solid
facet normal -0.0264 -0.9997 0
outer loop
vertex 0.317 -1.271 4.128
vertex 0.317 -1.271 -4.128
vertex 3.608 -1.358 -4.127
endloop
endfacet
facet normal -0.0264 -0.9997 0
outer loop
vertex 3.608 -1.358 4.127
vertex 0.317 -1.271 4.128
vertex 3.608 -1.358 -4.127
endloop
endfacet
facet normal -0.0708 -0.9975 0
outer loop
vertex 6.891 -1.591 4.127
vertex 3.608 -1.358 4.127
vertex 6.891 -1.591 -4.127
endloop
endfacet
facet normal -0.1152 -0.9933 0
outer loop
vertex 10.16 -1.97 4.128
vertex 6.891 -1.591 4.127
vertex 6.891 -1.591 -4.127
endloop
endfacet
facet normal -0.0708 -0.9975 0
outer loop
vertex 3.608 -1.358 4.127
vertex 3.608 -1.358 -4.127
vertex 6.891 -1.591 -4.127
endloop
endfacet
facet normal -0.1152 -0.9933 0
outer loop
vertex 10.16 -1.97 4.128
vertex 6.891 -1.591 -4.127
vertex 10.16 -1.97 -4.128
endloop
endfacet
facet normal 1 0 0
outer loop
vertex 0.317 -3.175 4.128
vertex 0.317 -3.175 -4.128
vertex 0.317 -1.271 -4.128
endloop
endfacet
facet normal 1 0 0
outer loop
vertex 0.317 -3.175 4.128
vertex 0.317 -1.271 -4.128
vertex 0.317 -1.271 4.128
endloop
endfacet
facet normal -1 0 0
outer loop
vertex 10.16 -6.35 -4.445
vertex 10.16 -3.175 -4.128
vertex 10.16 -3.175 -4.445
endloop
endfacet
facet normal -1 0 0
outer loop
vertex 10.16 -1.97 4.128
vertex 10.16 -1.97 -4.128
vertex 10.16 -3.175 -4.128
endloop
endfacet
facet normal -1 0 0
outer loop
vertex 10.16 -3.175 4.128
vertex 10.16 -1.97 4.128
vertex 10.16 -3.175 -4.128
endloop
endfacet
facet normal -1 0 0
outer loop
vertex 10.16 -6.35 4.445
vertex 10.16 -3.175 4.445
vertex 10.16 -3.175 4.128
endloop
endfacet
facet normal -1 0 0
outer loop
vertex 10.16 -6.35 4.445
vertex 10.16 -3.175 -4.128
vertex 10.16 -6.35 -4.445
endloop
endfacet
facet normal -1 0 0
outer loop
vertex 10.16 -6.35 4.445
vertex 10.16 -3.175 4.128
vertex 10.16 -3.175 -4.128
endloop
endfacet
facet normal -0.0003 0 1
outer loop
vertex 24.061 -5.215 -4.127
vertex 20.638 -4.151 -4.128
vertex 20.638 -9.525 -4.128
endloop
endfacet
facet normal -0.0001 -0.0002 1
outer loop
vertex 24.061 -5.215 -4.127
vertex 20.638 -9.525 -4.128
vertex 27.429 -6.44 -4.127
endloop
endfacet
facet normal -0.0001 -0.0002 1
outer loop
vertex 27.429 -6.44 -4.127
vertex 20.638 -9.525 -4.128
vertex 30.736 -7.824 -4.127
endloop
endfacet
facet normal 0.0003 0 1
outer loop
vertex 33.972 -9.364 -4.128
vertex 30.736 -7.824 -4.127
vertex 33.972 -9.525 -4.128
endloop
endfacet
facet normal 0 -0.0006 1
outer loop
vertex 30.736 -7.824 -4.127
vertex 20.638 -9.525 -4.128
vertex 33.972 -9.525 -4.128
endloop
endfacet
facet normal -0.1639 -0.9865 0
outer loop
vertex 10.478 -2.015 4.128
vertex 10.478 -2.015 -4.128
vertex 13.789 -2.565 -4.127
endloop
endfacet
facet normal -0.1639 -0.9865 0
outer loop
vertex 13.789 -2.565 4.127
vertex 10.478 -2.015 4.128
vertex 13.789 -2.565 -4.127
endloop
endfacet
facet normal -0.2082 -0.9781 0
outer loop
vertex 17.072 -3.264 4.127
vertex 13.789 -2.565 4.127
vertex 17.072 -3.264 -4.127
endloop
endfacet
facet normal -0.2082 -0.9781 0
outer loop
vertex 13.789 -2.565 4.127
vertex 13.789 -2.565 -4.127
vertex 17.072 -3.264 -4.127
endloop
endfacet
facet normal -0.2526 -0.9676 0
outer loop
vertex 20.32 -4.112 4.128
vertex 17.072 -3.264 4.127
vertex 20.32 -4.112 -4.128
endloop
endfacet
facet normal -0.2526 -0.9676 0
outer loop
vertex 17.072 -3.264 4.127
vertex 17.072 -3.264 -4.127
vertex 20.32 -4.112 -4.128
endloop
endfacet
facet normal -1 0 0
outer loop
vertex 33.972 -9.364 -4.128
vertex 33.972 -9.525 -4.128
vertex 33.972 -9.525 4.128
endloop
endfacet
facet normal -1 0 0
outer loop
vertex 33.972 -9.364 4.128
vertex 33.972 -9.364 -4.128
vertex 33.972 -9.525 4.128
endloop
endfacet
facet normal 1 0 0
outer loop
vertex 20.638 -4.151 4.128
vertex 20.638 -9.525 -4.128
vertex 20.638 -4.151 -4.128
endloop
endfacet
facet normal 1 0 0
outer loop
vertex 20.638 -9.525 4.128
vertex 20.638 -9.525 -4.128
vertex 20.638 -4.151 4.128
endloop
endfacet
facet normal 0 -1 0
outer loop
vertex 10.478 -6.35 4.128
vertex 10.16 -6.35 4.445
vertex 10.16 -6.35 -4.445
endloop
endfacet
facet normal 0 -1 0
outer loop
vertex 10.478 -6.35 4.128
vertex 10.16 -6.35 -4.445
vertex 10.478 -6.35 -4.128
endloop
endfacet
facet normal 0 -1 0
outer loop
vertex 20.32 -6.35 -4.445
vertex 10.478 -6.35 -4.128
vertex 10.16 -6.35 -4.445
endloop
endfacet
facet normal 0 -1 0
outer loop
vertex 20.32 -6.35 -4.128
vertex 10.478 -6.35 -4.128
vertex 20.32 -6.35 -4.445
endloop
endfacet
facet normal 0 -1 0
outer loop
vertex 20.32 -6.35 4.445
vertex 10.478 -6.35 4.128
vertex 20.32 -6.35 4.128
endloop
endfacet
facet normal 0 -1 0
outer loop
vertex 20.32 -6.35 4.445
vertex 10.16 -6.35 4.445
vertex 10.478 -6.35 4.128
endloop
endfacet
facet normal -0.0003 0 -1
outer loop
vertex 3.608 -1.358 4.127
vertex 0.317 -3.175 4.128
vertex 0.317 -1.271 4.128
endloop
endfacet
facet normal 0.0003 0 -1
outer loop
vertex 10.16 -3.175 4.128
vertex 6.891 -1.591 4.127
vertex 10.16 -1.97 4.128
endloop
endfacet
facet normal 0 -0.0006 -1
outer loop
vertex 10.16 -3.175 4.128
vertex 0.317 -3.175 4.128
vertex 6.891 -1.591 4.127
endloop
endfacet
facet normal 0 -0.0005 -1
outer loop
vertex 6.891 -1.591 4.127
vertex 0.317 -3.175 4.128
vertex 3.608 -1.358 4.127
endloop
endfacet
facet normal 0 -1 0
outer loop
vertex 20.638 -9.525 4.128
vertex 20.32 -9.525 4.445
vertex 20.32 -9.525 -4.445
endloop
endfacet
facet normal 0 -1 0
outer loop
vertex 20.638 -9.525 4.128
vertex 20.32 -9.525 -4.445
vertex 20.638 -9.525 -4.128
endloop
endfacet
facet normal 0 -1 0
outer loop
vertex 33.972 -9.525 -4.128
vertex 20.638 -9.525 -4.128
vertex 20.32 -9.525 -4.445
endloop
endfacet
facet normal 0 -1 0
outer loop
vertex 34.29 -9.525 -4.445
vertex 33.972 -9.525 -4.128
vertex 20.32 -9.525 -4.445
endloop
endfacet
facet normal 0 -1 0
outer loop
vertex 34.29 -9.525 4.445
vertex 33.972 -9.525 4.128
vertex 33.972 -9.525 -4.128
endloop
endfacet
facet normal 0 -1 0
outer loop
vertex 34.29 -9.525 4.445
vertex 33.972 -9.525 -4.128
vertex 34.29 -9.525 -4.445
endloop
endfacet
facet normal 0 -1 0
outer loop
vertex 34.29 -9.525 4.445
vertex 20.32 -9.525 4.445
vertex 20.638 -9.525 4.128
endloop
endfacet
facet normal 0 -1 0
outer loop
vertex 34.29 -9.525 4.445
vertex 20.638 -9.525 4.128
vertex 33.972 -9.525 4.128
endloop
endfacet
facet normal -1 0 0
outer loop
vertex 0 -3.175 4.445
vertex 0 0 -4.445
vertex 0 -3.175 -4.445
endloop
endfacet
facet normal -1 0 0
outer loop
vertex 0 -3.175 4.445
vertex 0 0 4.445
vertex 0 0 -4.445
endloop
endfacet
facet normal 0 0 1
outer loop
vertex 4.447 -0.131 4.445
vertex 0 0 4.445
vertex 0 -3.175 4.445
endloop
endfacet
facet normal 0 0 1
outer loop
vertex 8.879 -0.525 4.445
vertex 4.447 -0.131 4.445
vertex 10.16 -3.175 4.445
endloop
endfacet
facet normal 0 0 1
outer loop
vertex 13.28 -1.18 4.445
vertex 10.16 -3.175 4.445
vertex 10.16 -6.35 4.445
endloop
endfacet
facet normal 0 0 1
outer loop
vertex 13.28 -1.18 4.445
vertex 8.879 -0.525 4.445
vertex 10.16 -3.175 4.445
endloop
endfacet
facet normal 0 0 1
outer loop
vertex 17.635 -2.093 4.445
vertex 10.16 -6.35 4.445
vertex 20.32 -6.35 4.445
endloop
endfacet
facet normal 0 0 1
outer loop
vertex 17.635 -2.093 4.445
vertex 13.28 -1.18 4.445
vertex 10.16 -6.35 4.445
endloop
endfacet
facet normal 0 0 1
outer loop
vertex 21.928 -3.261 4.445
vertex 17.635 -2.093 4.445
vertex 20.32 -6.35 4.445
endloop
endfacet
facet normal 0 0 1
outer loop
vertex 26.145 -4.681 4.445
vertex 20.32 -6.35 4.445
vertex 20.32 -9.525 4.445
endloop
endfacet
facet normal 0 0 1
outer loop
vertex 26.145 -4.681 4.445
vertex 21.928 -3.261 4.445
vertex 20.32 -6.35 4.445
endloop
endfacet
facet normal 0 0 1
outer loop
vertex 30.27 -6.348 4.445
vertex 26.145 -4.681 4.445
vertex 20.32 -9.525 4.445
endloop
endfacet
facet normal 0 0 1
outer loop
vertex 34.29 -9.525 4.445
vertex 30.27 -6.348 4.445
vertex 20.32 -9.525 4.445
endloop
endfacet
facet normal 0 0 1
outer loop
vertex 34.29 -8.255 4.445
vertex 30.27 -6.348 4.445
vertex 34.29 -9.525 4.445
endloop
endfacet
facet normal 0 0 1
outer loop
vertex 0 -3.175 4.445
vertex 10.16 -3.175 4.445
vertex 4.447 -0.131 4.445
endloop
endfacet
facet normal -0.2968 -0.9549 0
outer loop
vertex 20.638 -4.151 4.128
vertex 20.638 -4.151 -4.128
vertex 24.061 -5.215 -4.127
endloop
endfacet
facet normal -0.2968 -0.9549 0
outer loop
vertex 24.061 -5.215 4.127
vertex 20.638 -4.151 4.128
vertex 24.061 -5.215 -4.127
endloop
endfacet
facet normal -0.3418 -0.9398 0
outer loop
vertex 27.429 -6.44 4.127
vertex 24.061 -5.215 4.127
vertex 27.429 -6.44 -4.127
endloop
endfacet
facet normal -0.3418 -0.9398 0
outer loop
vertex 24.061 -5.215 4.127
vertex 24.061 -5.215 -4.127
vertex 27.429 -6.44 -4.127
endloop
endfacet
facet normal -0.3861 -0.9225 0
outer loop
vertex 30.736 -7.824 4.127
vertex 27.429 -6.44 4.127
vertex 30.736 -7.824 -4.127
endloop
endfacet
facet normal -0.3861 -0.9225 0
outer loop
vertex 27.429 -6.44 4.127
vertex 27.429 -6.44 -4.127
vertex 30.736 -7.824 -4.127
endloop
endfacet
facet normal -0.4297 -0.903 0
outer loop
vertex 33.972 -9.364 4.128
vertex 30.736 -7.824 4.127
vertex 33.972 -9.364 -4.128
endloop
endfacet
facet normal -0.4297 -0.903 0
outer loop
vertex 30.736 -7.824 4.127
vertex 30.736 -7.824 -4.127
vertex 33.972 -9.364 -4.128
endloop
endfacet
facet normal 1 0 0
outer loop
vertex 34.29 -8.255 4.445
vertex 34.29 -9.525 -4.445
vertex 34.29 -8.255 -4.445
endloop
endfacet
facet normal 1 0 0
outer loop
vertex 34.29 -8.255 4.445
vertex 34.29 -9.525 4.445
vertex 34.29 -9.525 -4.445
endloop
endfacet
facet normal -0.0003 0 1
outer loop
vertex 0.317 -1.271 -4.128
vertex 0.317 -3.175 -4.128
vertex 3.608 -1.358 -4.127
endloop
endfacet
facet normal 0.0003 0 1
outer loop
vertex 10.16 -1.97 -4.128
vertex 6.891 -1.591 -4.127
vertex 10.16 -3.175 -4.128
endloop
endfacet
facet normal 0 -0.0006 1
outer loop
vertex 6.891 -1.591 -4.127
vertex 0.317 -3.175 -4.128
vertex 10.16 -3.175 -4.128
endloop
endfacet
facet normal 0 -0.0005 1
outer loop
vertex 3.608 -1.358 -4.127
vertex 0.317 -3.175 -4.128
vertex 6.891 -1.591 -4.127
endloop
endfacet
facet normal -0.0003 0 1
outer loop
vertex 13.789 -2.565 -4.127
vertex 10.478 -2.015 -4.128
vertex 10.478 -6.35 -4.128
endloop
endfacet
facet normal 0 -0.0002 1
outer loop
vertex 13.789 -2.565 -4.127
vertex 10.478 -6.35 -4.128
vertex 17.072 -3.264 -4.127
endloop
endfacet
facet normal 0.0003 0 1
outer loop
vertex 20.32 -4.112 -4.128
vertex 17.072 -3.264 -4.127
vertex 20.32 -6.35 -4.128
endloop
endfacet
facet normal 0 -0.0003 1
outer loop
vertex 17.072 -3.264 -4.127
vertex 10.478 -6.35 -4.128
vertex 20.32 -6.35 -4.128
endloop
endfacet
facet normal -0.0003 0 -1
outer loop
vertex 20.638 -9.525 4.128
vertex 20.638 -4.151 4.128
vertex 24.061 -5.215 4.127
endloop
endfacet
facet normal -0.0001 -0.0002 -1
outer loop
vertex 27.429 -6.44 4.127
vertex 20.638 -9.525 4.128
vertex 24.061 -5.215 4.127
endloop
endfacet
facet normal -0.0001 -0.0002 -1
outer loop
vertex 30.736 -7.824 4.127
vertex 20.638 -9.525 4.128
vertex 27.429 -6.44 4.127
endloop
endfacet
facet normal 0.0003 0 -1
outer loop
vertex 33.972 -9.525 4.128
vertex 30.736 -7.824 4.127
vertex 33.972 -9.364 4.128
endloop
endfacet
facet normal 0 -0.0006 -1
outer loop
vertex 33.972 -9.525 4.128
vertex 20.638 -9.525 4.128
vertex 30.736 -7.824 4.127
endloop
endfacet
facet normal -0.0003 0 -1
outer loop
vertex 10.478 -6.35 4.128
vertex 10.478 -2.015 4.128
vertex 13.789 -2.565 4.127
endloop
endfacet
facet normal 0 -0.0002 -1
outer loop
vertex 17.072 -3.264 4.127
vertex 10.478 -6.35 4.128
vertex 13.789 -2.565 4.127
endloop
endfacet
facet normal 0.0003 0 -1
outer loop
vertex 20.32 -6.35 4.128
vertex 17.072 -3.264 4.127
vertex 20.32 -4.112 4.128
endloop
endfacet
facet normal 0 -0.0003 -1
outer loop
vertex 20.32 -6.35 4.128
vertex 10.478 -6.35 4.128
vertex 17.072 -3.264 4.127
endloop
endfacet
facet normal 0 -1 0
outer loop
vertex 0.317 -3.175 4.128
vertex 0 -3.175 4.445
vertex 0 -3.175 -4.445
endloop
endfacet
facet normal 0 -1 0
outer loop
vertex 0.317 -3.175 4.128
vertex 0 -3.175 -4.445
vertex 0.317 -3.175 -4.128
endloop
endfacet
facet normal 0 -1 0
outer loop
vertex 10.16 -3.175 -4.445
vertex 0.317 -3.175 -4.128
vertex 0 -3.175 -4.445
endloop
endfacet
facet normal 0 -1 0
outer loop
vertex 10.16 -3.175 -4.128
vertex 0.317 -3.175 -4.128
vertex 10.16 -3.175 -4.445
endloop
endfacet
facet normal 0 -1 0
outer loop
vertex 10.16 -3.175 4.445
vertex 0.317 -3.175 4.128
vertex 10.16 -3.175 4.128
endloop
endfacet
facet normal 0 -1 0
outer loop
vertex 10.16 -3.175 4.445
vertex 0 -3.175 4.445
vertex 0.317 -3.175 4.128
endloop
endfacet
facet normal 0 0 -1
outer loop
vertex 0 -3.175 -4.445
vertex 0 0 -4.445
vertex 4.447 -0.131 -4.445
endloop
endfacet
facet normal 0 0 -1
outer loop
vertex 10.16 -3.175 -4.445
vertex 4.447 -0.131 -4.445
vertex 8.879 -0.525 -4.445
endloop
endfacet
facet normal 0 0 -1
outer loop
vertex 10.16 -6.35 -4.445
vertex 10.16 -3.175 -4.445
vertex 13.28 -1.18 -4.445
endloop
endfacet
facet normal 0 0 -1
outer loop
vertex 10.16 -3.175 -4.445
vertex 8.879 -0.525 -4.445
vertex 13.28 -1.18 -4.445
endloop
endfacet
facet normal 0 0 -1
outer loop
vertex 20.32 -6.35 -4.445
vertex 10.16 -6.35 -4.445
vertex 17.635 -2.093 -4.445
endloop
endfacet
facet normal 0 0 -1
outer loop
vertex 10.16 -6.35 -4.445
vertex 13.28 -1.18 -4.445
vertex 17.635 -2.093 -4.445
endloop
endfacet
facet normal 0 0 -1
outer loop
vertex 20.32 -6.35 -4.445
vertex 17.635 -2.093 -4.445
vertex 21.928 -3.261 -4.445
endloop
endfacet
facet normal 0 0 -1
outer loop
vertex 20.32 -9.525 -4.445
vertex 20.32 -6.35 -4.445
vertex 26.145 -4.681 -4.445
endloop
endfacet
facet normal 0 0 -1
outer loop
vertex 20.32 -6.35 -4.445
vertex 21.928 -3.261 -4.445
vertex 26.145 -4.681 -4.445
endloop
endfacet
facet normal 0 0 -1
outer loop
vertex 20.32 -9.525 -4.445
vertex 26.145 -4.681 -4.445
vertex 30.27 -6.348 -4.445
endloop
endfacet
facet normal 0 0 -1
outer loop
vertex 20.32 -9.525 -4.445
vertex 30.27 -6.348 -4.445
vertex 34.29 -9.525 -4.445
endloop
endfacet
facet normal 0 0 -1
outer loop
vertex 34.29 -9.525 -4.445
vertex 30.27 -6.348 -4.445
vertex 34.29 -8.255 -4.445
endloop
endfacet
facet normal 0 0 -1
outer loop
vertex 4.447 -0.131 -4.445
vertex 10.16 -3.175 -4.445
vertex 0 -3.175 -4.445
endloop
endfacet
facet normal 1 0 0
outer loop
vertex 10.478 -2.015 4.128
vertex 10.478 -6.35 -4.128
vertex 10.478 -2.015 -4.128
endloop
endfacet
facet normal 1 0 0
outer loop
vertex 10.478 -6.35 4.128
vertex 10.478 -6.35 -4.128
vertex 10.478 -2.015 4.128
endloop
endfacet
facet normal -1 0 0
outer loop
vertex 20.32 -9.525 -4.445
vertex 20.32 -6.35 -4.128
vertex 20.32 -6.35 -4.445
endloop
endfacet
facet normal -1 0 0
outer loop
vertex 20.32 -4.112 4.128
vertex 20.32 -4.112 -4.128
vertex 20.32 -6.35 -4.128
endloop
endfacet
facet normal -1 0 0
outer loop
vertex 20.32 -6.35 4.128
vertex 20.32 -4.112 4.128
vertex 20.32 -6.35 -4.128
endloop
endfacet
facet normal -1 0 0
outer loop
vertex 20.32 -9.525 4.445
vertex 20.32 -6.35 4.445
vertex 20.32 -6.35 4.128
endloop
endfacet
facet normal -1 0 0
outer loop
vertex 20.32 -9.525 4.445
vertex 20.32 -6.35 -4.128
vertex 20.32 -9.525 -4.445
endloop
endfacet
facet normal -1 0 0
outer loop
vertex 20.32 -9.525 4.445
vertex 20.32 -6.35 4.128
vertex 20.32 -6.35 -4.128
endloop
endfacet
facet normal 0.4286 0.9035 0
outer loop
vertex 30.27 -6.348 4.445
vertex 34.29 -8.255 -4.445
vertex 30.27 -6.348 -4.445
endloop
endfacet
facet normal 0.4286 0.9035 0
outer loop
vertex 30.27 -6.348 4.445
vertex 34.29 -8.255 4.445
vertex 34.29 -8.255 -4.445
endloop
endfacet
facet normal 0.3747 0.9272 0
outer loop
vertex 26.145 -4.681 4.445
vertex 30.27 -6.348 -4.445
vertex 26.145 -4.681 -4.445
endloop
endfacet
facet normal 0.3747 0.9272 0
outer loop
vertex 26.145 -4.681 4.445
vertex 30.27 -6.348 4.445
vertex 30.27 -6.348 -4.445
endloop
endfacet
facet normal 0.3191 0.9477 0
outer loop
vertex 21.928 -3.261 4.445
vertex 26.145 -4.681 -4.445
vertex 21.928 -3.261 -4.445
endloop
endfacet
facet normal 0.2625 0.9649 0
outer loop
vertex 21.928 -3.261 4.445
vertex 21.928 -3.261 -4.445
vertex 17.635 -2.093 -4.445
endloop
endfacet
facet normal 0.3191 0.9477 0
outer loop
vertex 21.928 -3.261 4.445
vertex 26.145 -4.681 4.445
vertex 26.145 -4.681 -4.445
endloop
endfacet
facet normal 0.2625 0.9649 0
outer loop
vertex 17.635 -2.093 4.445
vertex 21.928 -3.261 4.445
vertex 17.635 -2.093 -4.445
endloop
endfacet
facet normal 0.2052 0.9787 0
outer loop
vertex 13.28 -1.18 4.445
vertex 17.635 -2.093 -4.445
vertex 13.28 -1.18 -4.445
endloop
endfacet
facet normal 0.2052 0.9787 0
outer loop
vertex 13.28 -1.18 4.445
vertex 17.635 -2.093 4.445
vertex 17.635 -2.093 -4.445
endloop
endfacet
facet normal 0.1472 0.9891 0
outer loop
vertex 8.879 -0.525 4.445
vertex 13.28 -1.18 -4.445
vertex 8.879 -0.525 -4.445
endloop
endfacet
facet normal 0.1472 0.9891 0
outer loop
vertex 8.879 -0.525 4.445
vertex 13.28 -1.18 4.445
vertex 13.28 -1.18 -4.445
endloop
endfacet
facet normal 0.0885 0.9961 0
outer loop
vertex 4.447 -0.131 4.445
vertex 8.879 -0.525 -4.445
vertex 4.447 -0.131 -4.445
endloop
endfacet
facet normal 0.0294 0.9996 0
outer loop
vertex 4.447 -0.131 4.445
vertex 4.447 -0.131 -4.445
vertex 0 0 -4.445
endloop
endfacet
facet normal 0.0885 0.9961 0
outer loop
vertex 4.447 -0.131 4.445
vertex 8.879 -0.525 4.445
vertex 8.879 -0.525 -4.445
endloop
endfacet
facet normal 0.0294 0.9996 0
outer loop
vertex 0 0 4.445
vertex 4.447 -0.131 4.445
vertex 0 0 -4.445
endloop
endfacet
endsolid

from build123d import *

# Parameters (mm, degrees)
BOSS_EXTRUDE1_DEPTH     = 4.445
CUT_EXTRUDE2_REACH      = 37.155
CUT_EXTRUDE2_END_RADIUS = 74.075192308
SKETCH2_W               = 9.8425
SKETCH2_H               = 8.255
CUT_EXTRUDE3_REACH      = 37.155
CUT_EXTRUDE3_END_RADIUS = 74.075192308
SKETCH3_W               = 9.8425
SKETCH3_H               = 8.255
CUT_EXTRUDE5_REACH      = 37.865
CUT_EXTRUDE5_END_RADIUS = 75.345192308
SKETCH4_W               = 13.335
SKETCH4_H               = 8.255


with BuildPart() as part:
    # Sketch1 → Boss-Extrude1 (new, symmetric)
    with BuildSketch(Plane.XY):
        with BuildLine():
            Line((0, 0), (0, -3.175))
            Line((0, -3.175), (10.16, -3.175))
            Line((10.16, -3.175), (10.16, -6.35))
            Line((10.16, -6.35), (20.32, -6.35))
            Line((20.32, -6.35), (20.32, -9.525))
            Line((20.32, -9.525), (34.29, -9.525))
            Line((34.29, -9.525), (34.29, -8.255))
            ThreePointArc((34.29, -8.255), (17.634831478, -2.0928154), (0, 0))
        make_face()
    extrude(amount=BOSS_EXTRUDE1_DEPTH, both=True)

    # Cut-Extrude2: up to this cylinder (the profile starts inside it)
    cut_extrude2_end = Plane(origin=(0, -75.345192308, 0), z_dir=(0, 0, -1)) * Cylinder(CUT_EXTRUDE2_END_RADIUS, 223.460384615, mode=Mode.PRIVATE)
    # Sketch2 → Cut-Extrude2 (cut, up to the surface)
    with BuildSketch(Plane.XZ.offset(3.175), mode=Mode.PRIVATE) as cut_extrude2_sk1:
        with Locations((5.23875, 0)):
            Rectangle(SKETCH2_W, SKETCH2_H)
    cut_extrude2_tool1 = extrude(cut_extrude2_sk1.sketch, amount=-CUT_EXTRUDE2_REACH, mode=Mode.PRIVATE) & cut_extrude2_end
    add(cut_extrude2_tool1.solids().sort_by_distance((5.23875, -3.175, 0))[0], mode=Mode.SUBTRACT)

    # Cut-Extrude3: up to this cylinder (the profile starts inside it)
    cut_extrude3_end = Plane(origin=(0, -75.345192308, 0), z_dir=(0, 0, -1)) * Cylinder(CUT_EXTRUDE3_END_RADIUS, 223.460384615, mode=Mode.PRIVATE)
    # Sketch3 → Cut-Extrude3 (cut, up to the surface)
    with BuildSketch(Plane.XZ.offset(6.35), mode=Mode.PRIVATE) as cut_extrude3_sk1:
        with Locations((15.39875, 0)):
            Rectangle(SKETCH3_W, SKETCH3_H)
    cut_extrude3_tool1 = extrude(cut_extrude3_sk1.sketch, amount=-CUT_EXTRUDE3_REACH, mode=Mode.PRIVATE) & cut_extrude3_end
    add(cut_extrude3_tool1.solids().sort_by_distance((15.39875, -6.35, 0))[0], mode=Mode.SUBTRACT)

    # Cut-Extrude5: up to this cylinder (the profile starts inside it)
    cut_extrude5_end = Plane(origin=(0, -76.615192308, 0), z_dir=(0, 0, -1)) * Cylinder(CUT_EXTRUDE5_END_RADIUS, 227.420384615, mode=Mode.PRIVATE)
    # Sketch4 → Cut-Extrude5 (cut, up to the surface)
    with BuildSketch(Plane.XZ.offset(9.525), mode=Mode.PRIVATE) as cut_extrude5_sk1:
        with Locations((27.305, 0)):
            Rectangle(SKETCH4_W, SKETCH4_H)
    cut_extrude5_tool1 = extrude(cut_extrude5_sk1.sketch, amount=-CUT_EXTRUDE5_REACH, mode=Mode.PRIVATE) & cut_extrude5_end
    add(cut_extrude5_tool1.solids().sort_by_distance((27.305, -9.525, 0))[0], mode=Mode.SUBTRACT)


solid = part.part
